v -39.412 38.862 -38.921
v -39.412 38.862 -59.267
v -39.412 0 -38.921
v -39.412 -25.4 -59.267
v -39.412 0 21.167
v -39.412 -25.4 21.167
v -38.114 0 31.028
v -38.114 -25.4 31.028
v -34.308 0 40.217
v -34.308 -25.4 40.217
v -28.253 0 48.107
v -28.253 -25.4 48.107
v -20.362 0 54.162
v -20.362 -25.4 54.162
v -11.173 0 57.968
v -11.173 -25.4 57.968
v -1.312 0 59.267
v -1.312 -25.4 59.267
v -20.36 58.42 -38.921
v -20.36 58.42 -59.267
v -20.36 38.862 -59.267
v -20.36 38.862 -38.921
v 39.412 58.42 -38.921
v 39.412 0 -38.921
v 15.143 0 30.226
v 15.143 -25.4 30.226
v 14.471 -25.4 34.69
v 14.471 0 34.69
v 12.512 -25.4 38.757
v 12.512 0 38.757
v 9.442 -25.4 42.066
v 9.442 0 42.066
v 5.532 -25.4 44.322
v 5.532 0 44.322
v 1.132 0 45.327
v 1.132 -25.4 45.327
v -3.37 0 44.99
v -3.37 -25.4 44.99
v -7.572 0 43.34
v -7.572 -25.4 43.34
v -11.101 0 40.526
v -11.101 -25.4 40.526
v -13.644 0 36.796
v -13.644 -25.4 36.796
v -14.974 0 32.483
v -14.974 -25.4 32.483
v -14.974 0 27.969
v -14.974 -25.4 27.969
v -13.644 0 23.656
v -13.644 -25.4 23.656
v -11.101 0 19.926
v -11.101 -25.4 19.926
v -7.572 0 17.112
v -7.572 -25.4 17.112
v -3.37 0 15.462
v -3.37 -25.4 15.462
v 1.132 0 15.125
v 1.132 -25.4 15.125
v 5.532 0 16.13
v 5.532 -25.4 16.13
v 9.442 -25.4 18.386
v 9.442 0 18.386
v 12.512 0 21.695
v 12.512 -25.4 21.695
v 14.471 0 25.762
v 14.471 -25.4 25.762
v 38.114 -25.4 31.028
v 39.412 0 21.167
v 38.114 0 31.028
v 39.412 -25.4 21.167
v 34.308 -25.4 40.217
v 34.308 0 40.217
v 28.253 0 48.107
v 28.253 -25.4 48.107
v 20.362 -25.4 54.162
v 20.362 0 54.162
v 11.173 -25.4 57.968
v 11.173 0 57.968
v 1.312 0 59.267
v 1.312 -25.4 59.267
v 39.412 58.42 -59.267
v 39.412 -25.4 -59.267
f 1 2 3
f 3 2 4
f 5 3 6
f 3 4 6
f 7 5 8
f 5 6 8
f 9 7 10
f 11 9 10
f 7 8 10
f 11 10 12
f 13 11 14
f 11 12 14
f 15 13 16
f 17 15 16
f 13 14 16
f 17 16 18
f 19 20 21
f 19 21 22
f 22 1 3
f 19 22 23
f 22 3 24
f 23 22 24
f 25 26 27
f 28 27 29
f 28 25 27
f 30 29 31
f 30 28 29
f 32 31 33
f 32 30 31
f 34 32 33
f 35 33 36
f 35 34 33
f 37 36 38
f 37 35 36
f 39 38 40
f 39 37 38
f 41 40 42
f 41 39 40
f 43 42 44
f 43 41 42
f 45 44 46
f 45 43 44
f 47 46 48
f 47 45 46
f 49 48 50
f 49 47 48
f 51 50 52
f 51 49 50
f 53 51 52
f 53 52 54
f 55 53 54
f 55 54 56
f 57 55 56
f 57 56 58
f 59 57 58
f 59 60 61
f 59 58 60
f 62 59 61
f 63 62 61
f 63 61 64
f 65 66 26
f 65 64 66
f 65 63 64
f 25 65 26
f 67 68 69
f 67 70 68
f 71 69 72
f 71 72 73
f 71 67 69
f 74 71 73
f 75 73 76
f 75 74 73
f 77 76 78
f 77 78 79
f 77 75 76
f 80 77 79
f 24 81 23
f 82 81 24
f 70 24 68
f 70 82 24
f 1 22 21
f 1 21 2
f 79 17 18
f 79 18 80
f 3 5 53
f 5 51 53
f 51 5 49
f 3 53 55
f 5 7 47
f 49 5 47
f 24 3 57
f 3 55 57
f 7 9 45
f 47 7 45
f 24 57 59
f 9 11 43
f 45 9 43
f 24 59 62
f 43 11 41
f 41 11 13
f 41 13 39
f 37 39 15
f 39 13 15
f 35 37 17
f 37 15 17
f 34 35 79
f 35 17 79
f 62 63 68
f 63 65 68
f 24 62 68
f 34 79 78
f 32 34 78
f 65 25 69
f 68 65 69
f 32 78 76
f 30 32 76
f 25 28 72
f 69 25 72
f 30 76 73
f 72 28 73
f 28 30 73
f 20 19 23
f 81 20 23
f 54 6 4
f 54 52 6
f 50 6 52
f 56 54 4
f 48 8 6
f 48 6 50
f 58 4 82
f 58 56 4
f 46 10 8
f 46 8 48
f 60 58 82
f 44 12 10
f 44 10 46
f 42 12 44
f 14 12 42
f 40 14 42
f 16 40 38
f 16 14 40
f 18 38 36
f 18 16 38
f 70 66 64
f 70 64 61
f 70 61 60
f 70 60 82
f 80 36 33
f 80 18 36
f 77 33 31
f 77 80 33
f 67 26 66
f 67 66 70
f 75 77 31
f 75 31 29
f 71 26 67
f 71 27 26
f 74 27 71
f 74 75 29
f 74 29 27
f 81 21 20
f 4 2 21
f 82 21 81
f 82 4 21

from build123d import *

# Parameters (mm, degrees)
F0_W     = 78.8246691227
F0_H     = 118.5333281755
F1_DEPTH = 25.4
F2_R     = 38.1
F3_R     = 15.1432948242
F4_DEPTH = 25.401
F5_W     = 78.8246691227
F5_H     = 20.3456624932
F6_DEPTH = 58.42
F7_W     = 19.0527010709
F7_H     = 20.3456624932
F8_DEPTH = 19.558


with BuildPart() as f1:
    # F0 (on Front) → F1 (new body)
    with BuildSketch(Plane.XZ):
        Rectangle(F0_W, F0_H)
    extrude(amount=F1_DEPTH)

    # F2
    f2_edges = [f1.edges().sort_by_distance(p)[0] for p in [
        (-39.412335, -12.7, 59.266664),
        (39.412335, -12.7, 59.266664),
    ]]
    fillet(f2_edges, radius=F2_R)

    # F3 (on Front) → F4 (cut, through all)
    with BuildSketch(Plane.XZ):
        with Locations((0, 30.226001516)):
            Circle(F3_R)
    extrude(amount=F4_DEPTH, mode=Mode.SUBTRACT)

    # F5 (on Front) → F6 (join)
    with BuildSketch(Plane.XZ):
        with Locations((0, -49.0938328412)):
            Rectangle(F5_W, F5_H)
    extrude(amount=-F6_DEPTH)

    # F7 (on face) → F8 (cut)
    with BuildSketch(Plane(origin=(0, 58.42, 0), x_dir=(-1, 0, 0), z_dir=(0, 1, 0))):
        with Locations((29.8859840259, -49.0938328412)):
            Rectangle(F7_W, F7_H)
    extrude(amount=-F8_DEPTH, mode=Mode.SUBTRACT)


solid = f1.part
